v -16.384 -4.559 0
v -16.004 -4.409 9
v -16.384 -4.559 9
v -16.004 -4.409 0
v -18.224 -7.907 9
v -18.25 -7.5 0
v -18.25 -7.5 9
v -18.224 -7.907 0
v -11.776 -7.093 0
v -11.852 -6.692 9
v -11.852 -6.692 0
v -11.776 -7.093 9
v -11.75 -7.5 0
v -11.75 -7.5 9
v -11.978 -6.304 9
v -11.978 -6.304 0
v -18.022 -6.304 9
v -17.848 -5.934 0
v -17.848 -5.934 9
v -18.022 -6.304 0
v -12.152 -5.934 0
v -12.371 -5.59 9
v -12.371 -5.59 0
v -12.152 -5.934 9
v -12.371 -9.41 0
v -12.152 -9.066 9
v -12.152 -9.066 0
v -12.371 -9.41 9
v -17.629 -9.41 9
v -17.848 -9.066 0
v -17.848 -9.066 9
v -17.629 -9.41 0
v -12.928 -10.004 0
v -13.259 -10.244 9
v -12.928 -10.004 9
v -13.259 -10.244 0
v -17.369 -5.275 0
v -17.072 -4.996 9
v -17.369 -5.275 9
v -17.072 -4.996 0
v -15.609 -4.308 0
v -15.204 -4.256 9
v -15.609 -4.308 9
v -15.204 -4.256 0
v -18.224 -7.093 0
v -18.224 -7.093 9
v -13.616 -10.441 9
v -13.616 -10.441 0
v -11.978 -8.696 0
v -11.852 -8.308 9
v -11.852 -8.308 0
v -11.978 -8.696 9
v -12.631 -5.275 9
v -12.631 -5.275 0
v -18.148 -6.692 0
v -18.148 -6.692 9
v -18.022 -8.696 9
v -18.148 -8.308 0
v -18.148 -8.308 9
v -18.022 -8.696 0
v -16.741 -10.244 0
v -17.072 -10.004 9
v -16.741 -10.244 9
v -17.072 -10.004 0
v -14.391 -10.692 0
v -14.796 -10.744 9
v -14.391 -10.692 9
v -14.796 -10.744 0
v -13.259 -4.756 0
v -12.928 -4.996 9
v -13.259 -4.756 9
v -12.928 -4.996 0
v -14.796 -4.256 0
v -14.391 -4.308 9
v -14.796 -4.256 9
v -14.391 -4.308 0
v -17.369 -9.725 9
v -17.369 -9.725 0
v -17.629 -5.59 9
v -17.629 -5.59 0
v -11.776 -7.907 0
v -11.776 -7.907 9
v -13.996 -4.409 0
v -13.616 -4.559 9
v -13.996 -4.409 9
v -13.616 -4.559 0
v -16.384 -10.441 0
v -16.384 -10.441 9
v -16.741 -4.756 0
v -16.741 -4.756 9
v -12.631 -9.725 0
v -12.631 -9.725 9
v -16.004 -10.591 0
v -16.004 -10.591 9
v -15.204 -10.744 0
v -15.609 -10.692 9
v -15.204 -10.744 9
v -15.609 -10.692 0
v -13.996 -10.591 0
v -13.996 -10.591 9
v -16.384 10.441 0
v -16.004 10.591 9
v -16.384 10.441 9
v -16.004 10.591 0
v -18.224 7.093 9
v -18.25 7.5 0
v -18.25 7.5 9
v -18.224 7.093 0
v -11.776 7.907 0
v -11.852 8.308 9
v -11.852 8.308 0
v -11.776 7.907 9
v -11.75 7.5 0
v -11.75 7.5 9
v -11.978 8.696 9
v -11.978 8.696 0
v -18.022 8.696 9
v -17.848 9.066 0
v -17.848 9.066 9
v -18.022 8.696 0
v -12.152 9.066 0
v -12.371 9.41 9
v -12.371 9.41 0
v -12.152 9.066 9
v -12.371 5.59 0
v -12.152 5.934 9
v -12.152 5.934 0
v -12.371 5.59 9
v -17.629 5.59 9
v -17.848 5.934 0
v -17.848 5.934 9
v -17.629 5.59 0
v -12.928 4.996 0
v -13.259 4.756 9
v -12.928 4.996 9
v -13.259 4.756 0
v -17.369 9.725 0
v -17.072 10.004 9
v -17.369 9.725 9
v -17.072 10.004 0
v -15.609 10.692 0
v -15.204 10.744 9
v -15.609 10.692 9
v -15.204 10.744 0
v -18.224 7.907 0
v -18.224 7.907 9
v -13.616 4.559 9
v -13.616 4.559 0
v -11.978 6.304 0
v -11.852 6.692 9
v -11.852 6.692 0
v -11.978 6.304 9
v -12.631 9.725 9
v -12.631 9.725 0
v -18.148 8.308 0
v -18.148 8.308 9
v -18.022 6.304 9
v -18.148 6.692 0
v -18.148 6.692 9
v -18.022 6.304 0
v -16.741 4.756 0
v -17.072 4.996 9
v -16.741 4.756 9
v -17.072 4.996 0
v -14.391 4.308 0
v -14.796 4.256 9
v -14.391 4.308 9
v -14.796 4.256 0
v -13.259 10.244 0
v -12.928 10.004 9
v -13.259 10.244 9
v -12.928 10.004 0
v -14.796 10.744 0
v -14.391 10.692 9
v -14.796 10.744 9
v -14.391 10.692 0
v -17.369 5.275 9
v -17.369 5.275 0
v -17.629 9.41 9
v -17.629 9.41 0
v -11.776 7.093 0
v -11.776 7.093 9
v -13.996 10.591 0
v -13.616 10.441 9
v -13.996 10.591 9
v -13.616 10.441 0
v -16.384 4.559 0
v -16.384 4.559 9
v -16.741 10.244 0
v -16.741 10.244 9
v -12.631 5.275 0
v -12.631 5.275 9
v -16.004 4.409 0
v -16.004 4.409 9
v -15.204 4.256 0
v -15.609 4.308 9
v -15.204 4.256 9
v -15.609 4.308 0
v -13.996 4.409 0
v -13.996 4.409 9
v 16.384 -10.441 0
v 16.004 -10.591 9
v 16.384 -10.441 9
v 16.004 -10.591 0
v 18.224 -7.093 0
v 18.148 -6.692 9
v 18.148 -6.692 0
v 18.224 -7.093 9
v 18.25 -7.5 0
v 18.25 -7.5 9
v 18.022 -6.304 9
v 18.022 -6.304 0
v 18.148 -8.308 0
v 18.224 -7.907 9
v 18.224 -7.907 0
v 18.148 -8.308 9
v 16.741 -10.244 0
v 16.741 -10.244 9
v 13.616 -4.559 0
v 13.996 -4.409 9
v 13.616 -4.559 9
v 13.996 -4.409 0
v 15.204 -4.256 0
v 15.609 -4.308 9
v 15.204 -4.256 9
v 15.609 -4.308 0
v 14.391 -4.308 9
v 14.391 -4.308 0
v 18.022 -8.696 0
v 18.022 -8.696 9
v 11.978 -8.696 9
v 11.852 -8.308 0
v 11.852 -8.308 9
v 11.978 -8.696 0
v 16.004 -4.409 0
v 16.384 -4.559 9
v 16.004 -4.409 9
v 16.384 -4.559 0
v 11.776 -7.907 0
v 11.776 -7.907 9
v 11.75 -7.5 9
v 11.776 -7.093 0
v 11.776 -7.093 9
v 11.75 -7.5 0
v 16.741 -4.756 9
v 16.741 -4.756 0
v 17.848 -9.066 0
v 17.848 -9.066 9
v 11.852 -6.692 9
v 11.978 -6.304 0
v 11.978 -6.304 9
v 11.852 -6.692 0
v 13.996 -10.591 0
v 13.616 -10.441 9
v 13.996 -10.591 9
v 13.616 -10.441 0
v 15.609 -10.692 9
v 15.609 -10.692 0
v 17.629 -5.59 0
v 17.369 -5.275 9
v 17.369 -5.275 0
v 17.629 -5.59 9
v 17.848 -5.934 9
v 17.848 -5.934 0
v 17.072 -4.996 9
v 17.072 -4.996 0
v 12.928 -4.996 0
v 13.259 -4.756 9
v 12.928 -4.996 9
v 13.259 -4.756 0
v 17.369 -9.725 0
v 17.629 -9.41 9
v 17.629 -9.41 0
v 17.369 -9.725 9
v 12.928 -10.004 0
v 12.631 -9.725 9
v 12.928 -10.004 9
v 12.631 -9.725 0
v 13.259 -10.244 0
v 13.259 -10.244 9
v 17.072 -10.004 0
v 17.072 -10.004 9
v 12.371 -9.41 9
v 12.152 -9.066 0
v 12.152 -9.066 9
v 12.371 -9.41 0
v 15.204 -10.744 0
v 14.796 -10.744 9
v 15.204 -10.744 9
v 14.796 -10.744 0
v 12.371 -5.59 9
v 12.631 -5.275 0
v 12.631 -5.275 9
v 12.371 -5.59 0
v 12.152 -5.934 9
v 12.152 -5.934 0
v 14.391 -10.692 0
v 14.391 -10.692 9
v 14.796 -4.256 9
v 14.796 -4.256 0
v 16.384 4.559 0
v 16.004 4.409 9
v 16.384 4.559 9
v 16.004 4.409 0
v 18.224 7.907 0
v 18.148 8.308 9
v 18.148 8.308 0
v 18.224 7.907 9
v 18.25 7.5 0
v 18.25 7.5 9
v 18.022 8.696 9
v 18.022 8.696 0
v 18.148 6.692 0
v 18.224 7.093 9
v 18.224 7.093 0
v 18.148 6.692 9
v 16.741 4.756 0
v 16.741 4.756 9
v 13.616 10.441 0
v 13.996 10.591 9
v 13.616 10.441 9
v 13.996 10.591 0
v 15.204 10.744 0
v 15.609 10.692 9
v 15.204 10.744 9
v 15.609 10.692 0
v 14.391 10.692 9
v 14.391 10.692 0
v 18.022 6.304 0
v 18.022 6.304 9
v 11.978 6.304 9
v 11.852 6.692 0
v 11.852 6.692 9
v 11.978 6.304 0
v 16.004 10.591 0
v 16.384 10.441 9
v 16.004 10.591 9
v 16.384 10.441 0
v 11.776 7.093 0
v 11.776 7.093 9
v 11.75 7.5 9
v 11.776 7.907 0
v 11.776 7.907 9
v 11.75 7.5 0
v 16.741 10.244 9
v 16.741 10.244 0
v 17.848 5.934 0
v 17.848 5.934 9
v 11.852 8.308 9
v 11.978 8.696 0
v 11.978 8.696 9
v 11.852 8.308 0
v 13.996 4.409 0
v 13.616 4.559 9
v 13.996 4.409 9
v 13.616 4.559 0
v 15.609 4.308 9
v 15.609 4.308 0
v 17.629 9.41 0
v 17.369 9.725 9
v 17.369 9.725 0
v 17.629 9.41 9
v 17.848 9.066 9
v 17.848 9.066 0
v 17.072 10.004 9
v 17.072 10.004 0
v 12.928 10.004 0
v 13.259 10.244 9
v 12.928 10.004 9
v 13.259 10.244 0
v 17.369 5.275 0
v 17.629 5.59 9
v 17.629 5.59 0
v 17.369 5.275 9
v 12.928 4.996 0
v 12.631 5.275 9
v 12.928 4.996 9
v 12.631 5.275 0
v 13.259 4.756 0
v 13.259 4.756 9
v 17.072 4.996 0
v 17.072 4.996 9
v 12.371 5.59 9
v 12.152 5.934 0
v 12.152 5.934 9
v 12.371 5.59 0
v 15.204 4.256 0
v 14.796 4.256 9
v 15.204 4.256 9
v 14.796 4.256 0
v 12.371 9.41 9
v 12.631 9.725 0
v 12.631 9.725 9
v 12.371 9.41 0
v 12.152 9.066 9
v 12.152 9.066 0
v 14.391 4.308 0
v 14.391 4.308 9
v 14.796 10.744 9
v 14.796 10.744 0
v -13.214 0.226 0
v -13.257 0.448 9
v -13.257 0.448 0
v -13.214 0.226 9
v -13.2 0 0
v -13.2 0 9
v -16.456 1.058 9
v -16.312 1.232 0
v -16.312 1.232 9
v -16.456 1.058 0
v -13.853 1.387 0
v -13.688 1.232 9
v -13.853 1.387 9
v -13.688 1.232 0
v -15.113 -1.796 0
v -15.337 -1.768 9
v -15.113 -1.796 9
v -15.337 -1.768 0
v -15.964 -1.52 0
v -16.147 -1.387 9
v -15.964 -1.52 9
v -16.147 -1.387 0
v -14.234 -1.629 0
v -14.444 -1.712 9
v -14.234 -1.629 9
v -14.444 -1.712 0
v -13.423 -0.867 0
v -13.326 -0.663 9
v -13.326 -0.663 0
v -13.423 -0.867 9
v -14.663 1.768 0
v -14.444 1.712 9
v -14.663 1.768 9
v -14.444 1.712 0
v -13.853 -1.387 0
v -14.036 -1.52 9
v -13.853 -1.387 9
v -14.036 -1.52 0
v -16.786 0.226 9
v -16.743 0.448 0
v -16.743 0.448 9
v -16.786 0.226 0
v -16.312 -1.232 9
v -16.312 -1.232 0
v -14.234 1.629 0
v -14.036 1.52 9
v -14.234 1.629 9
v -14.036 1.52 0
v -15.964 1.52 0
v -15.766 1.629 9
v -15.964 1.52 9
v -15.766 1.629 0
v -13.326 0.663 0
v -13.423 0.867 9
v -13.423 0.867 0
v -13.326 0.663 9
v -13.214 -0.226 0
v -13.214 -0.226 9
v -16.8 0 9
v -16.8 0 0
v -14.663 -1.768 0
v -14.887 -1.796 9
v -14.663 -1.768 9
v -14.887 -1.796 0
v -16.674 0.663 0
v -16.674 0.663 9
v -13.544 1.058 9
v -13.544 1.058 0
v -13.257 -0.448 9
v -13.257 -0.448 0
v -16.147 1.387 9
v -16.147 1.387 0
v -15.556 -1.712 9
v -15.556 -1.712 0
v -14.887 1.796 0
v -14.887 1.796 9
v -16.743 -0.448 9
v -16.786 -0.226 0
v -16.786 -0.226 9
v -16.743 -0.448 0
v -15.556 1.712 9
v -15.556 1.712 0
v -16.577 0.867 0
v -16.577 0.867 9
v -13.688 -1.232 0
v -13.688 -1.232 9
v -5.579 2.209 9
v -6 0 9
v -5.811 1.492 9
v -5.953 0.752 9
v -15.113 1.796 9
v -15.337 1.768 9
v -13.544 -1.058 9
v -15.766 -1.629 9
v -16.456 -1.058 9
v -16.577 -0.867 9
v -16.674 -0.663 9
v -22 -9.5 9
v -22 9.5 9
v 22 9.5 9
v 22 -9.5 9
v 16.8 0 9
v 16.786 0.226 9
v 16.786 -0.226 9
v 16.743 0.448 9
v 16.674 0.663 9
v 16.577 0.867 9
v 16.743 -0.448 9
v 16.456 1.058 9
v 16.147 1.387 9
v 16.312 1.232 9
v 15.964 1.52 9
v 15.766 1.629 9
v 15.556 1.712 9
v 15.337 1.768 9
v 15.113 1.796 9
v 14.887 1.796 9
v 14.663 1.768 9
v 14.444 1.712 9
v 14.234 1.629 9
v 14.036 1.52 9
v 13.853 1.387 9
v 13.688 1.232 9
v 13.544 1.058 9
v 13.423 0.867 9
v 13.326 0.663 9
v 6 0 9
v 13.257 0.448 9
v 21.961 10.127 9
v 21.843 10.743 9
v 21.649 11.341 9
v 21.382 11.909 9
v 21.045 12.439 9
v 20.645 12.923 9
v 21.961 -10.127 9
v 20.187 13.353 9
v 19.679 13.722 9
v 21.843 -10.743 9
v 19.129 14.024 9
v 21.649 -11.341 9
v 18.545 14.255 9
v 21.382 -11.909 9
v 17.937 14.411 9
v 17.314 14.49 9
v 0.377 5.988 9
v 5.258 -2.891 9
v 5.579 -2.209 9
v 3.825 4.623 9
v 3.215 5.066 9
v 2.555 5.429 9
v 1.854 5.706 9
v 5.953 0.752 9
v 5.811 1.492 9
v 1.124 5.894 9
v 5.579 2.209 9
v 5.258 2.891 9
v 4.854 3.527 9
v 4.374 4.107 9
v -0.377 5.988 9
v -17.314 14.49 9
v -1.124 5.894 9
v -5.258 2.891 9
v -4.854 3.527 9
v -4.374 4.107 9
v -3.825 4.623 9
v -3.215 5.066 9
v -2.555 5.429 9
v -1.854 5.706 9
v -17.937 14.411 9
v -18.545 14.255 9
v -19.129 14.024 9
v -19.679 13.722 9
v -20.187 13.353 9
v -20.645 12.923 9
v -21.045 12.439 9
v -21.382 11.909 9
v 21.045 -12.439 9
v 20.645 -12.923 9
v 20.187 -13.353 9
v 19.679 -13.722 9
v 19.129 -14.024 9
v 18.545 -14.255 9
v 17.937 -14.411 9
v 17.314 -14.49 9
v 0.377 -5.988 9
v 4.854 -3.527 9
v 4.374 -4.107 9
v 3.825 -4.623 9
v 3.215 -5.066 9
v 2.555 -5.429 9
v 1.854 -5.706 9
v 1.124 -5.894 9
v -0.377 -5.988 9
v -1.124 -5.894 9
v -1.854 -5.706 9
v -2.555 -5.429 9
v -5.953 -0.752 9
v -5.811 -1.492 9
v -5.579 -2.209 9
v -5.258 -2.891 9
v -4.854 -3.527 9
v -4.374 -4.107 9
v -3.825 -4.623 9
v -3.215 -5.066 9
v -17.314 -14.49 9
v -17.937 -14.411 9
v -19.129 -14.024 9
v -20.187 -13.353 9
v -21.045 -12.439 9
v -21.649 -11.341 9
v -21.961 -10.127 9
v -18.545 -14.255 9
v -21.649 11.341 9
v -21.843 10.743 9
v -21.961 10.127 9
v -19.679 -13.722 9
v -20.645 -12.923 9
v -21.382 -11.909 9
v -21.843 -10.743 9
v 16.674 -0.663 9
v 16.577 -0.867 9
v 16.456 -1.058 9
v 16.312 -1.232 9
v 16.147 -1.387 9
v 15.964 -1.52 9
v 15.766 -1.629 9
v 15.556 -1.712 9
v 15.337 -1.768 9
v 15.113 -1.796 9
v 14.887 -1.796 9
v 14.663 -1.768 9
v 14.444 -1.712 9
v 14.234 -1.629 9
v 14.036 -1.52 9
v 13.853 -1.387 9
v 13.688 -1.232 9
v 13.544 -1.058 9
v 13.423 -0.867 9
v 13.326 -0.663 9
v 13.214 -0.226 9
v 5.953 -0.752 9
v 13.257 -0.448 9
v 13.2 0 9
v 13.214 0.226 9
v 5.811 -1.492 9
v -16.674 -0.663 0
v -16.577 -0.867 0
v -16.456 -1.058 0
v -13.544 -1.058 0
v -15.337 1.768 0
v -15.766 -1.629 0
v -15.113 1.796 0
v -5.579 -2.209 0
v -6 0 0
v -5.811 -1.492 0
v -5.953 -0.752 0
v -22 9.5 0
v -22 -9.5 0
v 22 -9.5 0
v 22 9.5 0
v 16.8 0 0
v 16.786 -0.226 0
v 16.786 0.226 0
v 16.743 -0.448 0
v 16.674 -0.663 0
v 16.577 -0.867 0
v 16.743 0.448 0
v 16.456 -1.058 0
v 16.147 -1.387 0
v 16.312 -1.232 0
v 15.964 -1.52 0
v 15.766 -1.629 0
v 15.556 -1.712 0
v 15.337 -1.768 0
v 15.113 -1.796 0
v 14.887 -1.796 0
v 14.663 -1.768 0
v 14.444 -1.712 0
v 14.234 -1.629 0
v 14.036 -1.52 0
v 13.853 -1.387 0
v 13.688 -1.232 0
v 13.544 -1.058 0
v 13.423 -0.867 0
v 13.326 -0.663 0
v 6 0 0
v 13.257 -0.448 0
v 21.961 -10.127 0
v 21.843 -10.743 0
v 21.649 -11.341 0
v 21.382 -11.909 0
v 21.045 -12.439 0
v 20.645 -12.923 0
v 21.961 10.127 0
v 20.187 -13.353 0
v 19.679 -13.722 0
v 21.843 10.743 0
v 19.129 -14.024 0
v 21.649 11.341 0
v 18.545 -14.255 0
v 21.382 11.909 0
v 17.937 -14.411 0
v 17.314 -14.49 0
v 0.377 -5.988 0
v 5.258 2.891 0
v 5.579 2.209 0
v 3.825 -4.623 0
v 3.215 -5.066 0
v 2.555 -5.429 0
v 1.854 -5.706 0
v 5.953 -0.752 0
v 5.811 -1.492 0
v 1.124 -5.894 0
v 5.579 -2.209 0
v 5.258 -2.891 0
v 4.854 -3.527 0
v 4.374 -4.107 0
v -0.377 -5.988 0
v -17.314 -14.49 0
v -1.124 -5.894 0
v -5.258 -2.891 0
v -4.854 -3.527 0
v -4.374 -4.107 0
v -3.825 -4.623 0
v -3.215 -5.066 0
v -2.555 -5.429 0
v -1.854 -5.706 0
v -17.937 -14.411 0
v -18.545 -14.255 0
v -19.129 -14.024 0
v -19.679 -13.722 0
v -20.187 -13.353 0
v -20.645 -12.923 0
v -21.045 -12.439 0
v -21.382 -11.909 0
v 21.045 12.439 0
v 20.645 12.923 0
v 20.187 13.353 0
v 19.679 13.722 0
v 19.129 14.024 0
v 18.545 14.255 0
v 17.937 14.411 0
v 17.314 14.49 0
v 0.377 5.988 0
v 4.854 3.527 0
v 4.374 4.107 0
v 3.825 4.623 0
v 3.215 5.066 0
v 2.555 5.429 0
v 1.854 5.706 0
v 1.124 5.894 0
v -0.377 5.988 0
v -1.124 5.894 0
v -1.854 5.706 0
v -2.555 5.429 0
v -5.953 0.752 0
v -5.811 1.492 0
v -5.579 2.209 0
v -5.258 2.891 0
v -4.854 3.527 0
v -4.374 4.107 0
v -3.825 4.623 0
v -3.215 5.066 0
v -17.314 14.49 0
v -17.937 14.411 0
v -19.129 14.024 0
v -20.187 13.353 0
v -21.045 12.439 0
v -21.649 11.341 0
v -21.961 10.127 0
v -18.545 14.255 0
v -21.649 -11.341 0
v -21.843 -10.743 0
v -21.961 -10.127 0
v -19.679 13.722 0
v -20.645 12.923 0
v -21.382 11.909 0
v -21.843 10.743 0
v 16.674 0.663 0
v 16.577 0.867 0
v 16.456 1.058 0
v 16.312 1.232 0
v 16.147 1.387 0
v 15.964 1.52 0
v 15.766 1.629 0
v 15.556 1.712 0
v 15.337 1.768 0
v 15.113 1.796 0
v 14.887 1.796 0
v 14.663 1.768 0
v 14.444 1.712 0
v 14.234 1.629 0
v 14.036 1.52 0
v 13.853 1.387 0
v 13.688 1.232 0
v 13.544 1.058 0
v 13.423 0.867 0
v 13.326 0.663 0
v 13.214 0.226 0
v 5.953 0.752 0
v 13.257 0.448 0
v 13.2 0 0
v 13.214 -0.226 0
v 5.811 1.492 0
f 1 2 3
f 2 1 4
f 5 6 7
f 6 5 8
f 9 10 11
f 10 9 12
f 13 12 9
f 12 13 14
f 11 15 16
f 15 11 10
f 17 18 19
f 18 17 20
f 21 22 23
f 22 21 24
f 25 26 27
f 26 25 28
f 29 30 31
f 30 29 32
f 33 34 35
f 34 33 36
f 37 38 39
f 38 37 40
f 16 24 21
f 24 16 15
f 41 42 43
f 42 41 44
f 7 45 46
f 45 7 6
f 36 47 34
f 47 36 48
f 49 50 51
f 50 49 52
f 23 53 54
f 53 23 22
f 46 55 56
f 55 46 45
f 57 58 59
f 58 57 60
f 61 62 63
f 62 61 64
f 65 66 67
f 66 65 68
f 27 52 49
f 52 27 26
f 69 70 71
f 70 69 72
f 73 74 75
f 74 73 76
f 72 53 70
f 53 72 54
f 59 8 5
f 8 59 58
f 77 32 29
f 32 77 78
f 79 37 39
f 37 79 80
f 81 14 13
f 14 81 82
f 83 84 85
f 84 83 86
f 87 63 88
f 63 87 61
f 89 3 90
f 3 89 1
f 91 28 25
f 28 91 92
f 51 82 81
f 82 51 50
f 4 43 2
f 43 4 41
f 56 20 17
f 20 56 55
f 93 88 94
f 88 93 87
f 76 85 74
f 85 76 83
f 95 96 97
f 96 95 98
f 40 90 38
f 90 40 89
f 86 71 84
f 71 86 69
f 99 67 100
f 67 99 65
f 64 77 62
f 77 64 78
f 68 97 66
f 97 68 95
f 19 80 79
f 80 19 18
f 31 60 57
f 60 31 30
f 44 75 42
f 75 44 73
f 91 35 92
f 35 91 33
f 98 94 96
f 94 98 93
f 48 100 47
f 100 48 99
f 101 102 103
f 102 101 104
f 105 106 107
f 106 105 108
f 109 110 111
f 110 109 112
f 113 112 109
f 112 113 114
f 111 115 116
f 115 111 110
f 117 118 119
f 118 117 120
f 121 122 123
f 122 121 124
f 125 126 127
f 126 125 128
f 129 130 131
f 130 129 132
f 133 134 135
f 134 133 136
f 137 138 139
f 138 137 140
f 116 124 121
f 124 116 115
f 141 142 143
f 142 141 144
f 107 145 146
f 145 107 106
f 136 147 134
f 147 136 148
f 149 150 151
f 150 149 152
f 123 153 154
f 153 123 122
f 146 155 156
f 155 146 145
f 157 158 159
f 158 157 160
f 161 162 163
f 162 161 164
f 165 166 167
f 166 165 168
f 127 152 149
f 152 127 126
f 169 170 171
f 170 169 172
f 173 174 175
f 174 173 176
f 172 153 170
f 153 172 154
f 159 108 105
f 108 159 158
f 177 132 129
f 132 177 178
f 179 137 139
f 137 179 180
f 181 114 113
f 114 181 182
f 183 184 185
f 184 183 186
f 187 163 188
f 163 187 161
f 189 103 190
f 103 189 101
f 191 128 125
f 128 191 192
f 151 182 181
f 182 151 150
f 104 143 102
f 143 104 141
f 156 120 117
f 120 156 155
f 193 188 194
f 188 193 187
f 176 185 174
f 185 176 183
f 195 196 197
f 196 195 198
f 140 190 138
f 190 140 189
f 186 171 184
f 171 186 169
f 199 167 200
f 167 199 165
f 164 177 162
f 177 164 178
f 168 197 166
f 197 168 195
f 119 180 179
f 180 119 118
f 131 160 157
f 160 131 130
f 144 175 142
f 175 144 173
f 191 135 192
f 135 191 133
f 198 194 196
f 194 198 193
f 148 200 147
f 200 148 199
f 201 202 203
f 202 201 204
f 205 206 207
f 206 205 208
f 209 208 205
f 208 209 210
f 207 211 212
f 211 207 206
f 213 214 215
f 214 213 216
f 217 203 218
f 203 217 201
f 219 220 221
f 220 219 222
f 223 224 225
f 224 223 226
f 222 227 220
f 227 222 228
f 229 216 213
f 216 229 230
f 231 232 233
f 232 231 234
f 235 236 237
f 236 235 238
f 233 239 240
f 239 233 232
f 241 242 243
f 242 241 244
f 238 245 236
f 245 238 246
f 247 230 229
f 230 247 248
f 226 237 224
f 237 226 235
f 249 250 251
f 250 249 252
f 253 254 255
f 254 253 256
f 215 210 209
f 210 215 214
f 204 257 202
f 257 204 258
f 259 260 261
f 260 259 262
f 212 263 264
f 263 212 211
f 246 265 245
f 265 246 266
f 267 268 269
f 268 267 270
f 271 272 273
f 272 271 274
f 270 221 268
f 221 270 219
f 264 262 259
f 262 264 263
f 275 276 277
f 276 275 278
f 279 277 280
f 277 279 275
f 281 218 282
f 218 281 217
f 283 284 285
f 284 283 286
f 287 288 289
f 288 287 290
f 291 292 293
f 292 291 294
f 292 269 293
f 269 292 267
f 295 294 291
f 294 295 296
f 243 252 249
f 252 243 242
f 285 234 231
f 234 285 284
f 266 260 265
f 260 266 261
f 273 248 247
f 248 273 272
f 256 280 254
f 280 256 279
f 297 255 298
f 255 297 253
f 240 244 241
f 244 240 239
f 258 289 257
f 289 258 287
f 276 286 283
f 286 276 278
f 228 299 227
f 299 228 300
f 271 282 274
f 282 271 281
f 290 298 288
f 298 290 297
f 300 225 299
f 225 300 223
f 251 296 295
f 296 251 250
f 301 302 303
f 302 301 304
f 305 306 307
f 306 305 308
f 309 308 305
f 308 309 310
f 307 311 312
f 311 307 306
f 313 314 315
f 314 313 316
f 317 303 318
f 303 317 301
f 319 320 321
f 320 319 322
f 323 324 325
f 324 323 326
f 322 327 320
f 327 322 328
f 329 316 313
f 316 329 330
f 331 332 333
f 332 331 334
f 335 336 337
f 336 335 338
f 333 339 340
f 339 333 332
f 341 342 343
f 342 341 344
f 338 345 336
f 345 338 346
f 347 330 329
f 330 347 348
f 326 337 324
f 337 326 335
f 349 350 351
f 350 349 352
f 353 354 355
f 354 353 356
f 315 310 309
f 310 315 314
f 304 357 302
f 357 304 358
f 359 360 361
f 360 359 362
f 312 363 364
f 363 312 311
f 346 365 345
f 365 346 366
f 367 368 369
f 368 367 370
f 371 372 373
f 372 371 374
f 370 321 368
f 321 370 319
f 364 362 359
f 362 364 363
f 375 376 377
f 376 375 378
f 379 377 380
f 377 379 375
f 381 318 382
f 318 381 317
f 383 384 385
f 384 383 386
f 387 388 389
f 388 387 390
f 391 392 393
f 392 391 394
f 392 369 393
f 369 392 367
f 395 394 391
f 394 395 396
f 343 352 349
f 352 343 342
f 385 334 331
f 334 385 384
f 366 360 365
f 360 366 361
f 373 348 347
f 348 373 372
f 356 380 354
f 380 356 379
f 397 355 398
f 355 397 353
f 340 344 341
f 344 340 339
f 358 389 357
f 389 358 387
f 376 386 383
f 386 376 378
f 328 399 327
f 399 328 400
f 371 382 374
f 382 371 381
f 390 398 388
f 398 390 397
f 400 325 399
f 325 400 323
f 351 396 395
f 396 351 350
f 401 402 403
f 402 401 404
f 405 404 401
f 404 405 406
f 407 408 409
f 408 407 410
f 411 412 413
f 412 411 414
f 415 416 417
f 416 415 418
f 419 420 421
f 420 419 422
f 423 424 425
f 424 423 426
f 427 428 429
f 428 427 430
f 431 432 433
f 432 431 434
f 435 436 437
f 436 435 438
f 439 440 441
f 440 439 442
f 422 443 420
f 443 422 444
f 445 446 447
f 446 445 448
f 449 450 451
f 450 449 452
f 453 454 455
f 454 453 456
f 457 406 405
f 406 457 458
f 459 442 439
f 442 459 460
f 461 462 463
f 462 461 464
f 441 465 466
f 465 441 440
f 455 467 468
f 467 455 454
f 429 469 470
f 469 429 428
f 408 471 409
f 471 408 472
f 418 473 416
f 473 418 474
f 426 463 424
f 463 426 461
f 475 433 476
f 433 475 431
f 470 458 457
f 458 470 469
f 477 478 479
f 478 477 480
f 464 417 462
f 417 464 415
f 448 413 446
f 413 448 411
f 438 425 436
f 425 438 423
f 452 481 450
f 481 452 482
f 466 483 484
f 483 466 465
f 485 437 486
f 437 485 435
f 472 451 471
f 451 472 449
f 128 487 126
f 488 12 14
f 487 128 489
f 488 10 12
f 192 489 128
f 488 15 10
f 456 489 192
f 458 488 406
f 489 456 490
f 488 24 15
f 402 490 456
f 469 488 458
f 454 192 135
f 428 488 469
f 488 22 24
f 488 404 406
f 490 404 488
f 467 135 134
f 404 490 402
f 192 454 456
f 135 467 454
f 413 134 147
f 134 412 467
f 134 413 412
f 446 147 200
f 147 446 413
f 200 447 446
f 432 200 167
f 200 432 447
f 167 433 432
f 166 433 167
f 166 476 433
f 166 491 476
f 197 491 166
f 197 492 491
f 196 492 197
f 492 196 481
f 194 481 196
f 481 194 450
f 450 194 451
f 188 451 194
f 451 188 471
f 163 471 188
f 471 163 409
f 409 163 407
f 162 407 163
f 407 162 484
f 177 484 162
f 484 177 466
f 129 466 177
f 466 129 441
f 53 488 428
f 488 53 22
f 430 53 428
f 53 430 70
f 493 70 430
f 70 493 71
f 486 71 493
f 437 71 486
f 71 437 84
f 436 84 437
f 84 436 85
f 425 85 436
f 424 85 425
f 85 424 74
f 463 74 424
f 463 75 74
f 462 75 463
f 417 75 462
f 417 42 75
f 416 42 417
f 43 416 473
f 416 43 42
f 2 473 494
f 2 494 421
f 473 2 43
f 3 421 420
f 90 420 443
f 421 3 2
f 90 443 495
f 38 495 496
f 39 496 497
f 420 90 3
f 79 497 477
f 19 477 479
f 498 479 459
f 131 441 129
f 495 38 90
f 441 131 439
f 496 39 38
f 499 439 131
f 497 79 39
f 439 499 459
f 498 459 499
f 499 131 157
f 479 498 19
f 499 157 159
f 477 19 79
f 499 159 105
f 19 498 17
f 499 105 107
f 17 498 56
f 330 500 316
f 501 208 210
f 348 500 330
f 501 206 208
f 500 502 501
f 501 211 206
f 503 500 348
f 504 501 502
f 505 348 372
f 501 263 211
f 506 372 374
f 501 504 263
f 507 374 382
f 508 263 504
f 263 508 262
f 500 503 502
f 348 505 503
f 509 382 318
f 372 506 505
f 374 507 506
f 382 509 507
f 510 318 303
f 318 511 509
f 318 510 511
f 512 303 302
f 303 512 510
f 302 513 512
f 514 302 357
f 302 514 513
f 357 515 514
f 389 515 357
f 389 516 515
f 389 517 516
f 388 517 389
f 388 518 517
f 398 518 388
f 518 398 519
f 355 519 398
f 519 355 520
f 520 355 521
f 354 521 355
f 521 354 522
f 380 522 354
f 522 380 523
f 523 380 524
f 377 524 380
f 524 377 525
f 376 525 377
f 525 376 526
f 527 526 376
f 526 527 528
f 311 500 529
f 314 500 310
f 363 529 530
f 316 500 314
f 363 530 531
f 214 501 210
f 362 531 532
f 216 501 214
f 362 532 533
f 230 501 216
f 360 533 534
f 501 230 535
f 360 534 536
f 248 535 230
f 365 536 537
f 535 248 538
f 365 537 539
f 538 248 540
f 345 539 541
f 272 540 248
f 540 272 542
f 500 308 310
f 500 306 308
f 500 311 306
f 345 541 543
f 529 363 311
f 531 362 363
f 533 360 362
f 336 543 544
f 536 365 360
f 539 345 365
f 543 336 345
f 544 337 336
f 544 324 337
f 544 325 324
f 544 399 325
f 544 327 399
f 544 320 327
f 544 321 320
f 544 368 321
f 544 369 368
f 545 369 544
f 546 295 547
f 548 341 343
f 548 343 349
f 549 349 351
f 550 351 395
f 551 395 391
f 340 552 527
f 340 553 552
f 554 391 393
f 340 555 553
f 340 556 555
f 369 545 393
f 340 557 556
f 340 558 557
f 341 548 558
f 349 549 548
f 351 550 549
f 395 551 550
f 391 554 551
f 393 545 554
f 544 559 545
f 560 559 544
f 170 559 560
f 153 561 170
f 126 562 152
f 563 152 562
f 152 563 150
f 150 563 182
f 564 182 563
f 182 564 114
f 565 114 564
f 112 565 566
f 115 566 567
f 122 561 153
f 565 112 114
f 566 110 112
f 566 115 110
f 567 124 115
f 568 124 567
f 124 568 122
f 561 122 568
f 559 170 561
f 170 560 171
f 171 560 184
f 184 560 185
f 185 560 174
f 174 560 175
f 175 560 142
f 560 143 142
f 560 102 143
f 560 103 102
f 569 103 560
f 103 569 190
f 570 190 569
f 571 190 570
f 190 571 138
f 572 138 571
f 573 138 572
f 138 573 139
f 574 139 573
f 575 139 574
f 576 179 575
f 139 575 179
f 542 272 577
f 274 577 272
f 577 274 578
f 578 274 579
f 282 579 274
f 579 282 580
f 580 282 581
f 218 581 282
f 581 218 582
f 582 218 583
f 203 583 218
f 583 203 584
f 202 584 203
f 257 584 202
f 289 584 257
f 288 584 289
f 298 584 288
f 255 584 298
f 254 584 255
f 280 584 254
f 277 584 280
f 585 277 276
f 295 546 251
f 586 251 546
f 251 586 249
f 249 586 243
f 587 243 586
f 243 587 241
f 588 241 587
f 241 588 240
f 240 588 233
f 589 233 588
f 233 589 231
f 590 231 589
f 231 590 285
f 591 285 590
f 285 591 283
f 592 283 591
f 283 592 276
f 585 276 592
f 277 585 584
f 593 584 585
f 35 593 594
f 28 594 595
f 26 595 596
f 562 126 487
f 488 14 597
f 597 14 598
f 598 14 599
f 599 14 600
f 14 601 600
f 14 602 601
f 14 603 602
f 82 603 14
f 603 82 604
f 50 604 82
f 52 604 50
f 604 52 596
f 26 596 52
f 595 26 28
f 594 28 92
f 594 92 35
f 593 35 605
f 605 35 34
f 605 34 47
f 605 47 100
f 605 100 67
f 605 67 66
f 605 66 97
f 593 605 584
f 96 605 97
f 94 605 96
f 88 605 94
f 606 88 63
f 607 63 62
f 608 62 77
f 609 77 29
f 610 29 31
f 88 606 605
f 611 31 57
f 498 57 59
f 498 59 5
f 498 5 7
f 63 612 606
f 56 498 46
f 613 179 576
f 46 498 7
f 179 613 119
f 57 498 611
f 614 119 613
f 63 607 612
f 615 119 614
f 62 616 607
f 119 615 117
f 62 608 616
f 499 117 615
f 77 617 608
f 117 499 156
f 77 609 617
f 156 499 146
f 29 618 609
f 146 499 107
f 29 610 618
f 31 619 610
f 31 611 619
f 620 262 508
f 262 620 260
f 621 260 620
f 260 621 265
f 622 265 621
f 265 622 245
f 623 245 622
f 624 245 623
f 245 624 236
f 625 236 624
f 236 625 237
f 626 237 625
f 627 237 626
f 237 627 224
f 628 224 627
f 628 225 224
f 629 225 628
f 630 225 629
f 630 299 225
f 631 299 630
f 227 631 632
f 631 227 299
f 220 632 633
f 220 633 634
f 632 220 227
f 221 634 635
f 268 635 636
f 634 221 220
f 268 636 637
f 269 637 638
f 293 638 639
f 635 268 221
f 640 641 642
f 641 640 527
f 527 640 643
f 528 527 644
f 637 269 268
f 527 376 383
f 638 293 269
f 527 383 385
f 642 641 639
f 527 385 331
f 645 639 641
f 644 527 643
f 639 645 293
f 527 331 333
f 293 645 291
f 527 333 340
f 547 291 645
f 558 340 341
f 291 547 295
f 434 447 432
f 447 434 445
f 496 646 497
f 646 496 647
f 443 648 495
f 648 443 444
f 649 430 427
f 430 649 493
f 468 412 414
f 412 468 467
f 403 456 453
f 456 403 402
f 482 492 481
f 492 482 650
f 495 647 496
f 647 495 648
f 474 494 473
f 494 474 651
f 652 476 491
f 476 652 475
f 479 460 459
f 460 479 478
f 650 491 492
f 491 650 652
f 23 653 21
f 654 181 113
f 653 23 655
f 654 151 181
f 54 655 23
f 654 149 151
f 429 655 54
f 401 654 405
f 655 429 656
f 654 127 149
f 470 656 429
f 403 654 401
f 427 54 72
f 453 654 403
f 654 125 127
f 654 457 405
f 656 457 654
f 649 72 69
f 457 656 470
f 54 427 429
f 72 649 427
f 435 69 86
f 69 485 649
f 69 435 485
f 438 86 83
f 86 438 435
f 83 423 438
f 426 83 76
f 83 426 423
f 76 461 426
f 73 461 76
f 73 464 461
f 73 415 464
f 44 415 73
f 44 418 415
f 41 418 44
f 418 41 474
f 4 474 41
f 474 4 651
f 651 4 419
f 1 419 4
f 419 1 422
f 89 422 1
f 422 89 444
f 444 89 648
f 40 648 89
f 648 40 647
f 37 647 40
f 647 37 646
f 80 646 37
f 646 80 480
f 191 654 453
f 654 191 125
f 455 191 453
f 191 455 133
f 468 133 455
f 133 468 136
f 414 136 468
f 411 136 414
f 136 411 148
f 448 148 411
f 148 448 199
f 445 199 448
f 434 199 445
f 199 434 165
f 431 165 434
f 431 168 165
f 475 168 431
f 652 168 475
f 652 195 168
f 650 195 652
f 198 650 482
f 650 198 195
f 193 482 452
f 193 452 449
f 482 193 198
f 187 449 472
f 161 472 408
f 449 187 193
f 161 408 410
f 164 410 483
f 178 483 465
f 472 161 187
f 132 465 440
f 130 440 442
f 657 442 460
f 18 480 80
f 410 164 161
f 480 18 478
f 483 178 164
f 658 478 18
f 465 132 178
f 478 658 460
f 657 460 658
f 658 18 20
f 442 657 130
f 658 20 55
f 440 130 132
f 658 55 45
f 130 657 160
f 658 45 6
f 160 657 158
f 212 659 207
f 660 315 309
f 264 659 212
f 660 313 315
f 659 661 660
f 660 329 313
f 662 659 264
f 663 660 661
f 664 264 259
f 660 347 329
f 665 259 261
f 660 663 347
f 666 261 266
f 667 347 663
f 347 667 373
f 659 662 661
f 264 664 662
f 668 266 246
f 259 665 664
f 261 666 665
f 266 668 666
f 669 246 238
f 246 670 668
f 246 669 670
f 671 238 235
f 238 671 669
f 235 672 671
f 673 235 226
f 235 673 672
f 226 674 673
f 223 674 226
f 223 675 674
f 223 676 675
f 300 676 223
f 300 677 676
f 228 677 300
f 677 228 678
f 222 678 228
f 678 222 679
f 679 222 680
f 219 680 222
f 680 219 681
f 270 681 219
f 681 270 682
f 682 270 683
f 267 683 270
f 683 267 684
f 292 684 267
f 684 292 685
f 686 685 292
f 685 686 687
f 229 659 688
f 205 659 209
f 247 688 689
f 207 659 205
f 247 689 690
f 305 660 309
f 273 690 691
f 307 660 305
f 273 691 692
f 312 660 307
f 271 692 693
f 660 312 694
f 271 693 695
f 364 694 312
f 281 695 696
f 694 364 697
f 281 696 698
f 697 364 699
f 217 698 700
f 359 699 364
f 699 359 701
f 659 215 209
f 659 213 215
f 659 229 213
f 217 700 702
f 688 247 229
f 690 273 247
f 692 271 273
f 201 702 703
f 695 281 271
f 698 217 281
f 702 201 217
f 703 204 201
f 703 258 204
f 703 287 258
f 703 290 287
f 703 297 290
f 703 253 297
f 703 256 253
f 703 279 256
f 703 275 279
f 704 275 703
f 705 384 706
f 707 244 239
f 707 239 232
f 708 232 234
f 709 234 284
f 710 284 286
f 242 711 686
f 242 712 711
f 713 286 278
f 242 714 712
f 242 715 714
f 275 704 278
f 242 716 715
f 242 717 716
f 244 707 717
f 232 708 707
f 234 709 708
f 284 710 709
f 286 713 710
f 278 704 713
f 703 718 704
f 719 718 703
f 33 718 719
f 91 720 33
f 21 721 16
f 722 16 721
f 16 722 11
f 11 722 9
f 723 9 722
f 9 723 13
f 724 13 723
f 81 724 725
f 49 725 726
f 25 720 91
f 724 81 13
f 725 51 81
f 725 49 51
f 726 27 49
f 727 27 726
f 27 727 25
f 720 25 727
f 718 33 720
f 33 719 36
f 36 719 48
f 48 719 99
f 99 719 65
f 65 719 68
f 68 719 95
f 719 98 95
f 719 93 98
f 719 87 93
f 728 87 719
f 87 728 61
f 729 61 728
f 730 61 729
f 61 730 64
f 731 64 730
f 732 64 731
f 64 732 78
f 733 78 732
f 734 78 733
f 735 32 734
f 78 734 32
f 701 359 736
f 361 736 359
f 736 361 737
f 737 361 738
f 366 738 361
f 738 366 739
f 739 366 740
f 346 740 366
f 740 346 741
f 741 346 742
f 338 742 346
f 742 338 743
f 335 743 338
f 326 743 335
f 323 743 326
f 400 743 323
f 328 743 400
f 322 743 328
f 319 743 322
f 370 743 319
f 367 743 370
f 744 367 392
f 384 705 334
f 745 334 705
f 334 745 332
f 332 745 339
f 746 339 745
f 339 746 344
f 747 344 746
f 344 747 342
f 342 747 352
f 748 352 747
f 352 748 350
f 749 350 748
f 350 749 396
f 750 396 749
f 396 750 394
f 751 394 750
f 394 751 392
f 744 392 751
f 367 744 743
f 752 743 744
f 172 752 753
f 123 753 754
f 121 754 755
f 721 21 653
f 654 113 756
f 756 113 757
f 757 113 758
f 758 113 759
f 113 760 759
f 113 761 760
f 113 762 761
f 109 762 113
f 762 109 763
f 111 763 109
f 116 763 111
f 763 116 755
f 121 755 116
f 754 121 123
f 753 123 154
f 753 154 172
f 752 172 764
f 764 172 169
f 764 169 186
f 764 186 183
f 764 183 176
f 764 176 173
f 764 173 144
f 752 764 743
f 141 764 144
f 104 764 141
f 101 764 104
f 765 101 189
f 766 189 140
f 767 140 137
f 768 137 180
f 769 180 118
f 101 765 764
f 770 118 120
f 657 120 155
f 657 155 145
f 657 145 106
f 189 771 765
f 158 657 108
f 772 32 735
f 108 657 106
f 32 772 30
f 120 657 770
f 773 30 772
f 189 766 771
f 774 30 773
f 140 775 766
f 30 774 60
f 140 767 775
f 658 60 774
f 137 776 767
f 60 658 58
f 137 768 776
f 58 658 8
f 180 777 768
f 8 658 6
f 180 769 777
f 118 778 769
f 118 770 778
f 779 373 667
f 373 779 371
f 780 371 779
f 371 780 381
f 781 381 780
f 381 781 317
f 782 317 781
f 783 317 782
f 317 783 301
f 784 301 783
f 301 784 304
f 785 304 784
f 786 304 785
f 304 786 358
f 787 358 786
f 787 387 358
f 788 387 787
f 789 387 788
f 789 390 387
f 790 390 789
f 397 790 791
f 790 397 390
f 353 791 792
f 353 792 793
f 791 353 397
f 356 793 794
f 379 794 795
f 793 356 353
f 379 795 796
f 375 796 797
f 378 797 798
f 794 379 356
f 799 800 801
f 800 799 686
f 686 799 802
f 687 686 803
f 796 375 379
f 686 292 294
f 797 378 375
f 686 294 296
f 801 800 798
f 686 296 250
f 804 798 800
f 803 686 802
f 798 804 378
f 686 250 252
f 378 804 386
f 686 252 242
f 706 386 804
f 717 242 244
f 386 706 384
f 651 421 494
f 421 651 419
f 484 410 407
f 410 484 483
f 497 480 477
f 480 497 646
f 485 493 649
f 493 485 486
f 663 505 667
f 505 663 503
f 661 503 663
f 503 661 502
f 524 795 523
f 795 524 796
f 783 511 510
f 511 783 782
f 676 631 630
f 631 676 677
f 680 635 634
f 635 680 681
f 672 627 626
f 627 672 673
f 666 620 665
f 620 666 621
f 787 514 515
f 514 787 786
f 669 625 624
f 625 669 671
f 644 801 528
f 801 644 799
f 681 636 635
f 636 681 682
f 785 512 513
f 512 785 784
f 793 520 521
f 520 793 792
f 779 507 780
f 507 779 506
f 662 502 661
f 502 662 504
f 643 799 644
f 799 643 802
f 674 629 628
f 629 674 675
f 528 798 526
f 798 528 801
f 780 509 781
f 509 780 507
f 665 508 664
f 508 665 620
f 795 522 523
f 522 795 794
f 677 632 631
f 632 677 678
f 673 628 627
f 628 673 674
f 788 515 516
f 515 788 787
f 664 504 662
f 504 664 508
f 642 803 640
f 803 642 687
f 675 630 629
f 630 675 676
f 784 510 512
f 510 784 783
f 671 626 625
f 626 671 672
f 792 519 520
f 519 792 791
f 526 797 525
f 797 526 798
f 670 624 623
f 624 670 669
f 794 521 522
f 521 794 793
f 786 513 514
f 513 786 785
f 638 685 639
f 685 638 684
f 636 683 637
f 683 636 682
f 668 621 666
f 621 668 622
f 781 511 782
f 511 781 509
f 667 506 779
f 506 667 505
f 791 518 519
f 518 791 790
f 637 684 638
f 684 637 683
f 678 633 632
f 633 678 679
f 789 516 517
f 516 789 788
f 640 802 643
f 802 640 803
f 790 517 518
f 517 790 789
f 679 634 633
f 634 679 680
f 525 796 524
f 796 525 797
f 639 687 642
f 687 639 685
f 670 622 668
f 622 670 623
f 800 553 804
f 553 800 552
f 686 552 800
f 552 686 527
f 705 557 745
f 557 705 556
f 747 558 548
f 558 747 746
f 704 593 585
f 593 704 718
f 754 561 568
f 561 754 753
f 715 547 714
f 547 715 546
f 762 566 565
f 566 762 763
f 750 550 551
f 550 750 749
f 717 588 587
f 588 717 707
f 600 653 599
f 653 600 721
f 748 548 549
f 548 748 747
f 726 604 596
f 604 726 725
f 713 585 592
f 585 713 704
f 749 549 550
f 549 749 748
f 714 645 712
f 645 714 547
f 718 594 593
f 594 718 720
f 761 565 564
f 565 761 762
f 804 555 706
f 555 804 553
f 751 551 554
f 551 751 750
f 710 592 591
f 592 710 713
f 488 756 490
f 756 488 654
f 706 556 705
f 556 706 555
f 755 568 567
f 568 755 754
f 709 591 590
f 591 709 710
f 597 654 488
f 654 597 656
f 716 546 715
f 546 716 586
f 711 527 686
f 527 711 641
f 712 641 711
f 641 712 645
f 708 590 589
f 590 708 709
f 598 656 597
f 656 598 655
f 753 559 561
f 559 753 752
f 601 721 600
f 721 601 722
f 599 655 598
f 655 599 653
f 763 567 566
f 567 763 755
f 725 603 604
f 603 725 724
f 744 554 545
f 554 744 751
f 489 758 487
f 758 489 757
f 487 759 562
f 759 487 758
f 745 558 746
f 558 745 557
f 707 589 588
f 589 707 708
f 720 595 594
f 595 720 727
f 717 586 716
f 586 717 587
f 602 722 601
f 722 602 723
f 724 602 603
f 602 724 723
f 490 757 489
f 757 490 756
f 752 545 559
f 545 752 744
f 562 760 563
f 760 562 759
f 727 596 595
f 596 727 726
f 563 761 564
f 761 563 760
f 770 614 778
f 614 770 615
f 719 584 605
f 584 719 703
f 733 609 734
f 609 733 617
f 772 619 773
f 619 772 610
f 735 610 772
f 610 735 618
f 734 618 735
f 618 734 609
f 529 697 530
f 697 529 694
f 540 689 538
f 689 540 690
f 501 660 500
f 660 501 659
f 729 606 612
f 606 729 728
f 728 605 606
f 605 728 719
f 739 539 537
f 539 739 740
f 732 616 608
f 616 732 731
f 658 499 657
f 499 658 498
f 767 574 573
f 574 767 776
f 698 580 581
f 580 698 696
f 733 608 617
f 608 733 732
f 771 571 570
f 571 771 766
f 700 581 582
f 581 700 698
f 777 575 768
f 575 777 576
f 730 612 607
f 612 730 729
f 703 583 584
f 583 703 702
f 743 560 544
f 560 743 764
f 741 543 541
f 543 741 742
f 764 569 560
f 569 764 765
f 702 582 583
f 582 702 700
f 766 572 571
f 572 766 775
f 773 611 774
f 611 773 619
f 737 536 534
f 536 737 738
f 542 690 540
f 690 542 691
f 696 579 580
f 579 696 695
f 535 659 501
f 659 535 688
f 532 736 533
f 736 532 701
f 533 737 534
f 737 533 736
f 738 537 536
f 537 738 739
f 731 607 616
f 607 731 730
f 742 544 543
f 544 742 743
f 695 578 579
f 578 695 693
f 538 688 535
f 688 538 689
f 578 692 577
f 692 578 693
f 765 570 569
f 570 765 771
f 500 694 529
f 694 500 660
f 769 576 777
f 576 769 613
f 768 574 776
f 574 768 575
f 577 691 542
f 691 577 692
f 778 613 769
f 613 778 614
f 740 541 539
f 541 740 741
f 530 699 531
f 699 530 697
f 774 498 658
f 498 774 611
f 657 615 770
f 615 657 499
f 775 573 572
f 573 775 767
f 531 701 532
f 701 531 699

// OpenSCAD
$fn = 50;


difference() {
	union() {
		hull() {
			translate(v = [-17.0000000000, 9.5000000000, 0]) {
				cylinder(h = 9, r = 5);
			}
			translate(v = [17.0000000000, 9.5000000000, 0]) {
				cylinder(h = 9, r = 5);
			}
			translate(v = [-17.0000000000, -9.5000000000, 0]) {
				cylinder(h = 9, r = 5);
			}
			translate(v = [17.0000000000, -9.5000000000, 0]) {
				cylinder(h = 9, r = 5);
			}
		}
	}
	union() {
		#translate(v = [-15.0000000000, -7.5000000000, 0]) {
			cylinder(h = 9, r = 3.2500000000);
		}
		#translate(v = [-15.0000000000, 7.5000000000, 0]) {
			cylinder(h = 9, r = 3.2500000000);
		}
		#translate(v = [15.0000000000, -7.5000000000, 0]) {
			cylinder(h = 9, r = 3.2500000000);
		}
		#translate(v = [15.0000000000, 7.5000000000, 0]) {
			cylinder(h = 9, r = 3.2500000000);
		}
		#translate(v = [-15.0000000000, -7.5000000000, -100.0000000000]) {
			cylinder(h = 200, r = 3.2500000000);
		}
		#translate(v = [-15.0000000000, 7.5000000000, -100.0000000000]) {
			cylinder(h = 200, r = 3.2500000000);
		}
		#translate(v = [15.0000000000, -7.5000000000, -100.0000000000]) {
			cylinder(h = 200, r = 3.2500000000);
		}
		#translate(v = [15.0000000000, 7.5000000000, -100.0000000000]) {
			cylinder(h = 200, r = 3.2500000000);
		}
		#translate(v = [-15.0000000000, -7.5000000000, 0]) {
			cylinder(h = 9, r = 1.8000000000);
		}
		#translate(v = [-15.0000000000, 0.0000000000, 0]) {
			cylinder(h = 9, r = 1.8000000000);
		}
		#translate(v = [-15.0000000000, 7.5000000000, 0]) {
			cylinder(h = 9, r = 1.8000000000);
		}
		#translate(v = [15.0000000000, -7.5000000000, 0]) {
			cylinder(h = 9, r = 1.8000000000);
		}
		#translate(v = [15.0000000000, 0.0000000000, 0]) {
			cylinder(h = 9, r = 1.8000000000);
		}
		#translate(v = [15.0000000000, 7.5000000000, 0]) {
			cylinder(h = 9, r = 1.8000000000);
		}
		#translate(v = [-15.0000000000, -7.5000000000, 0]) {
			cylinder(h = 9, r = 1.8000000000);
		}
		#translate(v = [-15.0000000000, 0.0000000000, 0]) {
			cylinder(h = 9, r = 1.8000000000);
		}
		#translate(v = [-15.0000000000, 7.5000000000, 0]) {
			cylinder(h = 9, r = 1.8000000000);
		}
		#translate(v = [15.0000000000, -7.5000000000, 0]) {
			cylinder(h = 9, r = 1.8000000000);
		}
		#translate(v = [15.0000000000, 0.0000000000, 0]) {
			cylinder(h = 9, r = 1.8000000000);
		}
		#translate(v = [15.0000000000, 7.5000000000, 0]) {
			cylinder(h = 9, r = 1.8000000000);
		}
		#translate(v = [-15.0000000000, -7.5000000000, 0]) {
			cylinder(h = 9, r = 1.8000000000);
		}
		#translate(v = [-15.0000000000, 0.0000000000, 0]) {
			cylinder(h = 9, r = 1.8000000000);
		}
		#translate(v = [-15.0000000000, 7.5000000000, 0]) {
			cylinder(h = 9, r = 1.8000000000);
		}
		#translate(v = [15.0000000000, -7.5000000000, 0]) {
			cylinder(h = 9, r = 1.8000000000);
		}
		#translate(v = [15.0000000000, 0.0000000000, 0]) {
			cylinder(h = 9, r = 1.8000000000);
		}
		#translate(v = [15.0000000000, 7.5000000000, 0]) {
			cylinder(h = 9, r = 1.8000000000);
		}
		#cylinder(h = 9, r = 6.0000000000);
	}
}
